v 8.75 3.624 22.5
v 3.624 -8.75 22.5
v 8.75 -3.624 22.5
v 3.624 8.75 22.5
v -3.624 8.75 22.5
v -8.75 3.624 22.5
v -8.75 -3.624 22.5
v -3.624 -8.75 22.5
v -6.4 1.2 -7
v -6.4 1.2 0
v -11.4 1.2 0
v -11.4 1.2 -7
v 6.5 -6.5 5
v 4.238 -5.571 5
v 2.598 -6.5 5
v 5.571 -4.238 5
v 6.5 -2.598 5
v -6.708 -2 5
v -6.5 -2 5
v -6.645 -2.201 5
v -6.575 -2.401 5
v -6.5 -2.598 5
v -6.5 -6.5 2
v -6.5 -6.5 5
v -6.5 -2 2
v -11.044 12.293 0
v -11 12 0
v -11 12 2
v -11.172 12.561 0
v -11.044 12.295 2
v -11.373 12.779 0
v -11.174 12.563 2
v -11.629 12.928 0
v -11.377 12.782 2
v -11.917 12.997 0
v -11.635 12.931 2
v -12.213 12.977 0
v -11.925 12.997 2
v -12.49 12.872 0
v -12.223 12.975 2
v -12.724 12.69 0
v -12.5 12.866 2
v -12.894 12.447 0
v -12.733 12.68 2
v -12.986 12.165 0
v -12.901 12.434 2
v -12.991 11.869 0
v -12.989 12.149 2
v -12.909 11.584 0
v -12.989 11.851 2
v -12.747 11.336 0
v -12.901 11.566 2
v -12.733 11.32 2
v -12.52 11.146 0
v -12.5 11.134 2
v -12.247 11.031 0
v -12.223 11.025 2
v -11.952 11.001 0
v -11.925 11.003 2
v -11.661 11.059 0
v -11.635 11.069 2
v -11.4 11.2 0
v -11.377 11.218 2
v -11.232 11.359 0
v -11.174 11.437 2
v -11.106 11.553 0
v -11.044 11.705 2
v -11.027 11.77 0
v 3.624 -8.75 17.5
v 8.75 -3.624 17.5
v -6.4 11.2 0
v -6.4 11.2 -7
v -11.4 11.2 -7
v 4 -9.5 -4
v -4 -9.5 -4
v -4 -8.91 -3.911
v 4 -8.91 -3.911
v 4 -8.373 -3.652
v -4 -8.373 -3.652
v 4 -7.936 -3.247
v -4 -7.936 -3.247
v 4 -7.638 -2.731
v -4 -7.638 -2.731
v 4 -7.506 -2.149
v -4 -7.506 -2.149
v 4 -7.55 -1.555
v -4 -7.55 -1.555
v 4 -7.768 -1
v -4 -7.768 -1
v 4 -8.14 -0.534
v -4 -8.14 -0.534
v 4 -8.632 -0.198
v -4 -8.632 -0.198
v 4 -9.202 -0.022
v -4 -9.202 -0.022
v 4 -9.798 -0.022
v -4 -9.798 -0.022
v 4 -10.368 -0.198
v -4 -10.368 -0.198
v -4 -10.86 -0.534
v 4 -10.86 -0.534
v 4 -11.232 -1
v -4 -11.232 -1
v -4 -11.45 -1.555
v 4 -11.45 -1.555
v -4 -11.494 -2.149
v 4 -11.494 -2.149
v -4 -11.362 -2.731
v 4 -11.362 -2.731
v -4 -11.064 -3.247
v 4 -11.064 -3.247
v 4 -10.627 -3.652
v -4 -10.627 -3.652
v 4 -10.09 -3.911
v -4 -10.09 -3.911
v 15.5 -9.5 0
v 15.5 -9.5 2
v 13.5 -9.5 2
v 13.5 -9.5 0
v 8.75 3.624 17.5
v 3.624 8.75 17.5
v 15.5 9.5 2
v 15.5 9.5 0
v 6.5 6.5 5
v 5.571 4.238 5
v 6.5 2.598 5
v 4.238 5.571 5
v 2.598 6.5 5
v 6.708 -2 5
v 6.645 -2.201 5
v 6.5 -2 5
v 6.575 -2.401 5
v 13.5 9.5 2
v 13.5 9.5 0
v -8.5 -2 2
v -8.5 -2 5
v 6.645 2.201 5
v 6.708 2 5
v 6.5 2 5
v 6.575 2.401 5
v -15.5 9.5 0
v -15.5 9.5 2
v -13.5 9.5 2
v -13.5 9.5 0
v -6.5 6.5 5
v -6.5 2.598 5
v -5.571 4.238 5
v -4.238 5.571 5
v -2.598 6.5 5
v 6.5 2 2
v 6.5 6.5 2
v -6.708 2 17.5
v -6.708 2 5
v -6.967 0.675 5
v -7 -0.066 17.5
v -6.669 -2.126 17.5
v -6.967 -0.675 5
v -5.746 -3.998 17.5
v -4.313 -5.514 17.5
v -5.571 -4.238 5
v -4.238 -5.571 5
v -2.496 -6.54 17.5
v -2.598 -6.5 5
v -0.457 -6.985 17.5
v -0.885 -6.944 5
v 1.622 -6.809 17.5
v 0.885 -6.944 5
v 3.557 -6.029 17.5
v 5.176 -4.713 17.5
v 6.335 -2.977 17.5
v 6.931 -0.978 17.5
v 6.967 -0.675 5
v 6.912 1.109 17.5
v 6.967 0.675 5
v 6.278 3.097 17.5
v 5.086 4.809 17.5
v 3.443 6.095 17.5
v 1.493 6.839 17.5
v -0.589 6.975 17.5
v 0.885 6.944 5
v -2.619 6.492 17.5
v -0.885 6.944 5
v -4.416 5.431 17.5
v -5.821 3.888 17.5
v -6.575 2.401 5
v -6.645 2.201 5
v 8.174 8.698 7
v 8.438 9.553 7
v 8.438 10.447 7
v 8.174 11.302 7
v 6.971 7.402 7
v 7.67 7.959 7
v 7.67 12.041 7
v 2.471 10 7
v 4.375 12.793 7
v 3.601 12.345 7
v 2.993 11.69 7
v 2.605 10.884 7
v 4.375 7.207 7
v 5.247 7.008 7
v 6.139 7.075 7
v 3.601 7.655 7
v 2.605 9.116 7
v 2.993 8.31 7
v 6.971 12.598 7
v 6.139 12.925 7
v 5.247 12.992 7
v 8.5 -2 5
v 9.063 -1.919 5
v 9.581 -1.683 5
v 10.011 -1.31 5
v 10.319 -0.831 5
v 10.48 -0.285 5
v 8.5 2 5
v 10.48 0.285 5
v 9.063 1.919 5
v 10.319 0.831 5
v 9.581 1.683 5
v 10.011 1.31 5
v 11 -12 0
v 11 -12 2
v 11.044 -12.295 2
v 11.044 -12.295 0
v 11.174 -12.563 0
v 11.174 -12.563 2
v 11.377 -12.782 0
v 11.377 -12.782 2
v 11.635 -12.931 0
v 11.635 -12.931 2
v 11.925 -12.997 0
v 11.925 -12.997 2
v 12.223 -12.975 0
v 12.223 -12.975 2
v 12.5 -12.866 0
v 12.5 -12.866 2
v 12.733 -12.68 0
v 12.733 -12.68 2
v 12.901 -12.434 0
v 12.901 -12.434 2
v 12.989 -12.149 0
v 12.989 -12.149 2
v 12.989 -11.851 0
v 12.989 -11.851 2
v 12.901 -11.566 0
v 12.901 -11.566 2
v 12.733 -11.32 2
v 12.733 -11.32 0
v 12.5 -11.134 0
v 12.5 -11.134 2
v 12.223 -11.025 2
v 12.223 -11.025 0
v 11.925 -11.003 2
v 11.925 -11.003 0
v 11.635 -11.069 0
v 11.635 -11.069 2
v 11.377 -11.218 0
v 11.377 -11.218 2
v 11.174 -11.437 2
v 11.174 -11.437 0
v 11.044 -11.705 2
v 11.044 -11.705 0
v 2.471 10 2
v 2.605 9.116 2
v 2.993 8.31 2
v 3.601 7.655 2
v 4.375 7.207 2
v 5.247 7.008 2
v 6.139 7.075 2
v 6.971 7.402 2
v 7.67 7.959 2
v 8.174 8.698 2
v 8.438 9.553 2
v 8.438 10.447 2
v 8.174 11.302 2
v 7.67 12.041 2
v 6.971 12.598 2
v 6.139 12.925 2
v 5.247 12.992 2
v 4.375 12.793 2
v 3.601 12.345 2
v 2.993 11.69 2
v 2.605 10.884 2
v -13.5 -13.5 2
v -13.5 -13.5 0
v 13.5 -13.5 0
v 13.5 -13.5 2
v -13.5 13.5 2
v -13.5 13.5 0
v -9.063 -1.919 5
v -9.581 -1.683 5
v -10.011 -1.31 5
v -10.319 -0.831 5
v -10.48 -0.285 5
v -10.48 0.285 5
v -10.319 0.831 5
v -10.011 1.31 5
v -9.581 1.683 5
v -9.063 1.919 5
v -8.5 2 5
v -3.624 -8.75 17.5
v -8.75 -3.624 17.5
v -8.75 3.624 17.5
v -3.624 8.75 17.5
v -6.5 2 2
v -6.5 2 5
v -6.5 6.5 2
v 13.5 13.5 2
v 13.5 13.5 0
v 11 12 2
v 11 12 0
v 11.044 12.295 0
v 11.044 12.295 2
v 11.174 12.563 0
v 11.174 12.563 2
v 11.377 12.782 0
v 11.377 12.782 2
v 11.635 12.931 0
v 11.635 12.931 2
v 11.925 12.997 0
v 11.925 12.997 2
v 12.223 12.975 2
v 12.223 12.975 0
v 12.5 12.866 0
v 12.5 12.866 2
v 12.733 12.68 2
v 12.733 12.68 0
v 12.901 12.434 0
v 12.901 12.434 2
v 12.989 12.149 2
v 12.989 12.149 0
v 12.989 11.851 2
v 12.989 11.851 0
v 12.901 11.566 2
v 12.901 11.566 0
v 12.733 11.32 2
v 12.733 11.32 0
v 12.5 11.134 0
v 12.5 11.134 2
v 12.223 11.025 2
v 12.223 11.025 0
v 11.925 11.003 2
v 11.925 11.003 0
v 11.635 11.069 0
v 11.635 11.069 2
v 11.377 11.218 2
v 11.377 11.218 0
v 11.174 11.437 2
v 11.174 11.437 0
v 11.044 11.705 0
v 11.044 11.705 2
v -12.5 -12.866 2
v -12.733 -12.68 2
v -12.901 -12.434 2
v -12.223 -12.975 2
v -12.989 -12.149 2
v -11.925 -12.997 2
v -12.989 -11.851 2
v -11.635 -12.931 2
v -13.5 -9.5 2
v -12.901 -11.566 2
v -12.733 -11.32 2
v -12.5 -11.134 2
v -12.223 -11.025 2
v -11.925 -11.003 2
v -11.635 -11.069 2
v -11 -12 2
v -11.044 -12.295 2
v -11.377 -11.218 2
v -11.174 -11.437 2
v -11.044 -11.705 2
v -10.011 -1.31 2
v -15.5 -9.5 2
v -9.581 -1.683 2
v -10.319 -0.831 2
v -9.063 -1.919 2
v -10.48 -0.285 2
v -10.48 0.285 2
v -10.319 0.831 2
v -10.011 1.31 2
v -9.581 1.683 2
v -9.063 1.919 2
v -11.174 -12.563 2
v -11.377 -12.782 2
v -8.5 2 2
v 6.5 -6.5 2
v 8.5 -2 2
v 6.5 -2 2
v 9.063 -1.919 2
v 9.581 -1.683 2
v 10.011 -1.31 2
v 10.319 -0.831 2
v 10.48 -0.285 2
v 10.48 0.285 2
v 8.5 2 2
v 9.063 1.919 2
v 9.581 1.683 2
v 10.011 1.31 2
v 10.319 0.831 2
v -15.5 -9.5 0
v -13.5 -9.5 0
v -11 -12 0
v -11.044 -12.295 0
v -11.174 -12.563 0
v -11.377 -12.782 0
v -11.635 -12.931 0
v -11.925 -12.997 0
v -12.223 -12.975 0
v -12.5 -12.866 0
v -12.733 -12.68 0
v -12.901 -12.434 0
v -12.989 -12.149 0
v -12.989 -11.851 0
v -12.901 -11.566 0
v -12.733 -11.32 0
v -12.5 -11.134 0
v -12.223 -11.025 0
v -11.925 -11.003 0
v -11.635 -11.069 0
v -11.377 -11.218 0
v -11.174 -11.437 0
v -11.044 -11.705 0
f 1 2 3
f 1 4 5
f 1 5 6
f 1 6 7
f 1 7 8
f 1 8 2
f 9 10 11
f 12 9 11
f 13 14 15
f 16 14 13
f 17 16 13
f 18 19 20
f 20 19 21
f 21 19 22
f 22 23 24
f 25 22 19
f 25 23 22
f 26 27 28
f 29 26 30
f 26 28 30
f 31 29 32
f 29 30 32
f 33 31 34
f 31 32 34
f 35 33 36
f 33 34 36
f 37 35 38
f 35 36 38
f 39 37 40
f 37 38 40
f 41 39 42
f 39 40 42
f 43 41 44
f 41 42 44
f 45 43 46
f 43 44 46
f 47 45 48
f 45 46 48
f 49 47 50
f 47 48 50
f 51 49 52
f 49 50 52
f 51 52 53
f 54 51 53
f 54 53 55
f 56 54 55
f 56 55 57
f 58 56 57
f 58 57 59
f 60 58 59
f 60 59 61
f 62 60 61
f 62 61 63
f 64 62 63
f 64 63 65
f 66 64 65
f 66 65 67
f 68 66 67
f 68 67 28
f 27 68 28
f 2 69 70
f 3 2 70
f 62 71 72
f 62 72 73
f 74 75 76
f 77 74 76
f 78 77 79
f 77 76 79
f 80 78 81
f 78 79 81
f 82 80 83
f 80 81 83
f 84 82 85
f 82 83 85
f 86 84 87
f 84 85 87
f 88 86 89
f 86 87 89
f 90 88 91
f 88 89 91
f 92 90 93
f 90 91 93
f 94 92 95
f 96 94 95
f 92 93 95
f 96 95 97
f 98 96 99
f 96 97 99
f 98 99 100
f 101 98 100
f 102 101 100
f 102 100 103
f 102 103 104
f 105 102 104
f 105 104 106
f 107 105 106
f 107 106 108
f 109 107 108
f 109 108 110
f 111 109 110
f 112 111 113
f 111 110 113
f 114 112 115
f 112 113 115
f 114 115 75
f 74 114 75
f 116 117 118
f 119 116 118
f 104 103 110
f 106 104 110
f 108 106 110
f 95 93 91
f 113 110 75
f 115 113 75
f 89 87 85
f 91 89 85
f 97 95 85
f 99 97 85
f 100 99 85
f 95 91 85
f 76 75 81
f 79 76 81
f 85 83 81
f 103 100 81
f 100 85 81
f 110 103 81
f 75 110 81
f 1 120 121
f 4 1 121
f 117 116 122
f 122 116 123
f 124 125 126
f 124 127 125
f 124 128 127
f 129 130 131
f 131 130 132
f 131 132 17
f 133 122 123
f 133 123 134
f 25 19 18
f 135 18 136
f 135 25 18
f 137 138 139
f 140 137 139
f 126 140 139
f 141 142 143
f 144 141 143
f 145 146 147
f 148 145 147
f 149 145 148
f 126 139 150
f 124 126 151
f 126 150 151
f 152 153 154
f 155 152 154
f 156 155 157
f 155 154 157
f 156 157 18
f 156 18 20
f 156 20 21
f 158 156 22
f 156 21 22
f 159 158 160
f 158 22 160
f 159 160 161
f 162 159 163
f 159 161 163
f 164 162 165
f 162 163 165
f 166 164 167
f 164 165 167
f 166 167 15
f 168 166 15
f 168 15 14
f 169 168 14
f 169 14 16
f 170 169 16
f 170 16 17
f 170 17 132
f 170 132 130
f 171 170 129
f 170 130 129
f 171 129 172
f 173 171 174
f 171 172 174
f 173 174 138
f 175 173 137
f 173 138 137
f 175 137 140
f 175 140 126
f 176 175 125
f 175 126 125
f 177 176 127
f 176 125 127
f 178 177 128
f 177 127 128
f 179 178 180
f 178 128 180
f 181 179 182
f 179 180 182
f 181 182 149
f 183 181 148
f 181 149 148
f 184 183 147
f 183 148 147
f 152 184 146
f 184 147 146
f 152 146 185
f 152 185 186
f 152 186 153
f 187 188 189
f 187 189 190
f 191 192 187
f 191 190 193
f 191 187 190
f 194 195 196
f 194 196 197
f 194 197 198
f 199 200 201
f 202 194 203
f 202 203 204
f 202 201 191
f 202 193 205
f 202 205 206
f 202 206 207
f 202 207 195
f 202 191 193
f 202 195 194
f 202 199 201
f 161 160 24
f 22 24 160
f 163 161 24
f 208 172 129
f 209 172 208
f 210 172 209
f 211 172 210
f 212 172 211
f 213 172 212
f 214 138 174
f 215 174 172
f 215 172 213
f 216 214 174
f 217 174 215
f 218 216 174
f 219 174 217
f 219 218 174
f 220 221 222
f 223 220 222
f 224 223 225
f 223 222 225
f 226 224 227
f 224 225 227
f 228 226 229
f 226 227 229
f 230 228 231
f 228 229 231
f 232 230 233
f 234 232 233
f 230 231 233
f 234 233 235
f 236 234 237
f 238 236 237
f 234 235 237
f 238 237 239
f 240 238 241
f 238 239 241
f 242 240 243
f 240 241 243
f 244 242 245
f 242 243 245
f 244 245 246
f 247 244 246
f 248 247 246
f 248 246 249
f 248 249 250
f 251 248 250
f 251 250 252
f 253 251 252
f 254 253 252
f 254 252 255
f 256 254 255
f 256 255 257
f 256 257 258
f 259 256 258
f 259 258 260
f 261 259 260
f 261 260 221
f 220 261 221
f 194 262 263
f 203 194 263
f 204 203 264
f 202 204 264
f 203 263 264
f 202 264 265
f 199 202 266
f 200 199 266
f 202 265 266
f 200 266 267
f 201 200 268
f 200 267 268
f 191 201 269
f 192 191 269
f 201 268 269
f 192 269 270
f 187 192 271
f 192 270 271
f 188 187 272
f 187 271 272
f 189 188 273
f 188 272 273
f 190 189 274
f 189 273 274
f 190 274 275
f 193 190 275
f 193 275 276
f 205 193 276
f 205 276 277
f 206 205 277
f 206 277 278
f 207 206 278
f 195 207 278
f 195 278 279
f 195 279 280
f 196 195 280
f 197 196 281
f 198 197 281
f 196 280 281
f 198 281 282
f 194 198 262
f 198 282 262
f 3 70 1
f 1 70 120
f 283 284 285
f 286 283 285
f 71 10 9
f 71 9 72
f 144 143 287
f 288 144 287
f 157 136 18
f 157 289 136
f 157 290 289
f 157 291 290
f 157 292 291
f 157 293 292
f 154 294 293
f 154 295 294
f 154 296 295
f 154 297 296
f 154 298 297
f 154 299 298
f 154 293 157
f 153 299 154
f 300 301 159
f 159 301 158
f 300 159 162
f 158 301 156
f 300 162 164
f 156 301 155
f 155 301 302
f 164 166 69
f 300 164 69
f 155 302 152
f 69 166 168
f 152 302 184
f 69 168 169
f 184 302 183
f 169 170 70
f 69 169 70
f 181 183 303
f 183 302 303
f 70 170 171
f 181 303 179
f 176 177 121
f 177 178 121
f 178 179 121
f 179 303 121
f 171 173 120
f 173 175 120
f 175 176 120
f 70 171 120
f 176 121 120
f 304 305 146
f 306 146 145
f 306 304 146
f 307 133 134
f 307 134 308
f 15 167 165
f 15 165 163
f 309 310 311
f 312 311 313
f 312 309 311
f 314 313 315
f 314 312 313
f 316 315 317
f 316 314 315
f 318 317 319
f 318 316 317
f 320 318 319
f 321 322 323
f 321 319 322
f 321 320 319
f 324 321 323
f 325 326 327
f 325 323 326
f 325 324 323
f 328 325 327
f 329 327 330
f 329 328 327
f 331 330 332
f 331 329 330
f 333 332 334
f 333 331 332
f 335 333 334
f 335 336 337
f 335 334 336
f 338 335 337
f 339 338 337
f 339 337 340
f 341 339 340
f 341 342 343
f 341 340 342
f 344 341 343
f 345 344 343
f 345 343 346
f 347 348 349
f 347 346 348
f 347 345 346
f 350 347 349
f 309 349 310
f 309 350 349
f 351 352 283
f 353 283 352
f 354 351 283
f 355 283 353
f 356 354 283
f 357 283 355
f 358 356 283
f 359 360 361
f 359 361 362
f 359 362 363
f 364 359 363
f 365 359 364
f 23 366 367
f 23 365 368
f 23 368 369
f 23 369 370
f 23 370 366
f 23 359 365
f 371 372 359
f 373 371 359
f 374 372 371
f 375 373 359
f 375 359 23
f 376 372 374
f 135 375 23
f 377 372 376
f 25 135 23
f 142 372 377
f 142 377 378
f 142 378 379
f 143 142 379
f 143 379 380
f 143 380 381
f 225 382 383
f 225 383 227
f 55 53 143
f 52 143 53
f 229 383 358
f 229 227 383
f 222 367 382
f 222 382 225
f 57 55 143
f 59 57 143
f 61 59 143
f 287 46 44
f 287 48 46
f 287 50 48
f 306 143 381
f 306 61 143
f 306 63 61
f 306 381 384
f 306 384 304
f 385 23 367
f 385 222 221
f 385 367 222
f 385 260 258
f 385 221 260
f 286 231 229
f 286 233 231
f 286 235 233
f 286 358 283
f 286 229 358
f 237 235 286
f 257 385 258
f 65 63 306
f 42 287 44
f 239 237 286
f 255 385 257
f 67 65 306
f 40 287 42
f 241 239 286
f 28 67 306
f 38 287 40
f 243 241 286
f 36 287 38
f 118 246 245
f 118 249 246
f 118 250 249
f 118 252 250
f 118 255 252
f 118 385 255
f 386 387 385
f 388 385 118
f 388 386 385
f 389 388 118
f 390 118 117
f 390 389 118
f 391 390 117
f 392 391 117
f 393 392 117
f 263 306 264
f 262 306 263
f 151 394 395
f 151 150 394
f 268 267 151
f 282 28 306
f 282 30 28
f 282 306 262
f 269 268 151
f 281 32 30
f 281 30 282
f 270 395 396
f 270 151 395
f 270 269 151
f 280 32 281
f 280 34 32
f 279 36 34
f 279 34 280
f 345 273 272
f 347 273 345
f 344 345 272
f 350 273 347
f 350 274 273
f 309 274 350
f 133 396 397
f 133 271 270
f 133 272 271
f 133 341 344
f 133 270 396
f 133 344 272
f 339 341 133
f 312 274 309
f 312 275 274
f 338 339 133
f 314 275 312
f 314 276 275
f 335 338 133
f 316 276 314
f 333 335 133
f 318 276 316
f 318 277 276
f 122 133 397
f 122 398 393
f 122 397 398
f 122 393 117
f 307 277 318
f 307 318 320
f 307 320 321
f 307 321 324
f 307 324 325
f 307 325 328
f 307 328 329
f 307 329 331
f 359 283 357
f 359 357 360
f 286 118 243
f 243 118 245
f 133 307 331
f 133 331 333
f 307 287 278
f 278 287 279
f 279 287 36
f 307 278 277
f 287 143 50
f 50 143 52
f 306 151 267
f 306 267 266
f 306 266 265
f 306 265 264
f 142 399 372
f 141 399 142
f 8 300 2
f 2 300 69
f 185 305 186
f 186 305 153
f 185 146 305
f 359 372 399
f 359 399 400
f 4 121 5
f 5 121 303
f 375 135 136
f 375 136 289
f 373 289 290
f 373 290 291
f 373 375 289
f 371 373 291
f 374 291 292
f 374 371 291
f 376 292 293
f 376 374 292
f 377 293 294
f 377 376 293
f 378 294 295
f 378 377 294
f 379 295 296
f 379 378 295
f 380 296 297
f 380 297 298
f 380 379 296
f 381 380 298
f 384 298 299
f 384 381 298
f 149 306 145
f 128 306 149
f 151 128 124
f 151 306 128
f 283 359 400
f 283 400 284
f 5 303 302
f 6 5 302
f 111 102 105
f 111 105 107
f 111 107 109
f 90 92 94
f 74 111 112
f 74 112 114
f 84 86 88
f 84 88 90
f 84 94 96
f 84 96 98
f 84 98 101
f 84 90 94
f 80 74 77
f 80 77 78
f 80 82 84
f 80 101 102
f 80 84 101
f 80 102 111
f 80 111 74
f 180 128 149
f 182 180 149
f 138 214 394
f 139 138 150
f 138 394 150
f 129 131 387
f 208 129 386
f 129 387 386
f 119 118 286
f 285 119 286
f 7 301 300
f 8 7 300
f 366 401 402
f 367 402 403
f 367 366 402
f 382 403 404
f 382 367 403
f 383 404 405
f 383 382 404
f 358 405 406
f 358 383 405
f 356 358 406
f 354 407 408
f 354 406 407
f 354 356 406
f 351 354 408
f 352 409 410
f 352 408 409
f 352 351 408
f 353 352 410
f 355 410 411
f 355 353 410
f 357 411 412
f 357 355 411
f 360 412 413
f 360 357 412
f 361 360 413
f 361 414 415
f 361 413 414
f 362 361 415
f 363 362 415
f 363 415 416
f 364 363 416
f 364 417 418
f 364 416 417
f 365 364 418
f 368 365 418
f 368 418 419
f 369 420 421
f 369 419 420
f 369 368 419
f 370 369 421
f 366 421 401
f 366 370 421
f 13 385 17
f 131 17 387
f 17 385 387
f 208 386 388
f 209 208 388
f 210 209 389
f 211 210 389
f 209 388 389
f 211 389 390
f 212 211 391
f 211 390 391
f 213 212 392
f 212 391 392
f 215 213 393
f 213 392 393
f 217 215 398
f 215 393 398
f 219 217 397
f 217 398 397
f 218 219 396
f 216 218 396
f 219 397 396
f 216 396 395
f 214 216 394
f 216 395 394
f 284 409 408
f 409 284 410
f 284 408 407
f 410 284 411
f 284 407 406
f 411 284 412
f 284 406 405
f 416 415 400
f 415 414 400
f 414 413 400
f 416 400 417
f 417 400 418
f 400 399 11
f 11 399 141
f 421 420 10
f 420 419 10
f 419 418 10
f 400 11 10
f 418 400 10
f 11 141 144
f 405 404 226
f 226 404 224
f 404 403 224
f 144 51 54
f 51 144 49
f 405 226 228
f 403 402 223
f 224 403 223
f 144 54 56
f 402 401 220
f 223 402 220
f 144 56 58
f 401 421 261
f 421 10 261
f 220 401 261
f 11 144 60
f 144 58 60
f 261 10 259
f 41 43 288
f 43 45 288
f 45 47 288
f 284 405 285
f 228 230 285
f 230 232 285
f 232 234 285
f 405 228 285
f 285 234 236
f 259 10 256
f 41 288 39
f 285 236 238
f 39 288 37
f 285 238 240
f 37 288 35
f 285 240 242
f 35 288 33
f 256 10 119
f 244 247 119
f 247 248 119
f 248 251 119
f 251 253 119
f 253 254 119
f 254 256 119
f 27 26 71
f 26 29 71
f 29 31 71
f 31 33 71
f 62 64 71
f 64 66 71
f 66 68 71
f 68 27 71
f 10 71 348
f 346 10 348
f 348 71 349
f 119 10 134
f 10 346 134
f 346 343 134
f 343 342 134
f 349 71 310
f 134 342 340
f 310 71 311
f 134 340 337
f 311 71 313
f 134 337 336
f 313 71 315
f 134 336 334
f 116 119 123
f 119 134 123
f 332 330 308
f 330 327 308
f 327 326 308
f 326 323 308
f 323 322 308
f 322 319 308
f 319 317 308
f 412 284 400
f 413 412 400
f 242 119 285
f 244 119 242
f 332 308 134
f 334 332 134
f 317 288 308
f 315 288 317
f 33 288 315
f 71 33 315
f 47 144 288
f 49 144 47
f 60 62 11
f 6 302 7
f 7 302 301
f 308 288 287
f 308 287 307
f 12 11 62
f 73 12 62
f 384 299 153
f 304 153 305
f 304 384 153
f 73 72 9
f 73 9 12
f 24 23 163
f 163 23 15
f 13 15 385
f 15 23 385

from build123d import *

# Parameters (mm, degrees)
SKETCH_1_W               = 31
SKETCH_1_H               = 27
EXTRUDE_426_DEPTH        = 2
SKETCH_2_W               = 2
SKETCH_2_H               = 4
CUT_EXTRUDE_591_DEPTH    = 21.651876428
SKETCH_3_R               = 1
CUT_EXTRUDE_937_DEPTH    = 21.651876428
MIRROR_2_COPY_1_SKETCH_W = 2
MIRROR_2_COPY_1_SKETCH_H = 4
MIRROR_2_COPY_1_DEPTH    = 21.651876428
MIRROR_2_COPY_2_SKETCH_R = 1
MIRROR_2_COPY_2_DEPTH    = 21.651876428
SKETCH_4_W               = 13
SKETCH_4_H               = 13
EXTRUDE_1335_DEPTH       = 3
EXTRUDE_1862_DEPTH       = 3
SKETCH_6_R               = 7
EXTRUDE_2122_DEPTH       = 12.5
EXTRUDE_2384_DEPTH       = 5
SKETCH_8_R               = 3
EXTRUDE_2930_DEPTH       = 5
SKETCH_9_W               = 5
SKETCH_9_H               = 10
USB_DEPTH                = 7
EXTRUDE_3576_DEPTH       = 4
EXTRUDE_3576_DEPTH_BACK  = 4
SKETCH_10_R              = 2


with BuildPart() as part:
    # Эскиз1 → Extrude 426 (new body)
    with BuildSketch(Plane.XY):
        Rectangle(SKETCH_1_W, SKETCH_1_H)
    extrude(amount=EXTRUDE_426_DEPTH)

    # Эскиз2 → Cut-Extrude 591 (cut, symmetric)
    with BuildSketch(Plane.XY.offset(2)):
        with Locations((-14.5, 11.5)):
            Rectangle(SKETCH_2_W, SKETCH_2_H)
    cut_extrude_591 = extrude(amount=CUT_EXTRUDE_591_DEPTH, both=True, mode=Mode.SUBTRACT)

    # Эскиз3 → Cut-Extrude 937 (cut, through all)
    with BuildSketch(Plane.XY.offset(2)):
        with Locations((-12, 12)):
            Circle(SKETCH_3_R)
    cut_extrude_937 = extrude(amount=-CUT_EXTRUDE_937_DEPTH, mode=Mode.SUBTRACT)

    # Зеркальное отражение1: Cut-Extrude 591, Cut-Extrude 937 across plane
    add(cut_extrude_591.mirror(Plane(origin=(0, 0, 0), x_dir=(0, 0, 1), z_dir=(1, 0, 0))), mode=Mode.SUBTRACT)
    add(cut_extrude_937.mirror(Plane(origin=(0, 0, 0), x_dir=(0, 0, 1), z_dir=(1, 0, 0))), mode=Mode.SUBTRACT)

    # Зеркальное отражение2: Cut-Extrude 591, Cut-Extrude 937 across plane
    add(cut_extrude_591.mirror(Plane.ZX), mode=Mode.SUBTRACT)
    add(cut_extrude_937.mirror(Plane.ZX), mode=Mode.SUBTRACT)

    # Зеркальное отражение2 copy 1 sketch → Зеркальное отражение2 copy 1 (cut, symmetric)
    with BuildSketch(Plane(origin=(0, 0, 2), x_dir=(-1, 0, 0), z_dir=(0, 0, 1))):
        with Locations((-14.5, 11.5)):
            Rectangle(MIRROR_2_COPY_1_SKETCH_W, MIRROR_2_COPY_1_SKETCH_H)
    extrude(amount=MIRROR_2_COPY_1_DEPTH, both=True, mode=Mode.SUBTRACT)

    # Зеркальное отражение2 copy 2 sketch → Зеркальное отражение2 copy 2 (cut, through all)
    with BuildSketch(Plane(origin=(0, 0, 2), x_dir=(-1, 0, 0), z_dir=(0, 0, 1))):
        with Locations((-12, 12)):
            Circle(MIRROR_2_COPY_2_SKETCH_R)
    extrude(amount=-MIRROR_2_COPY_2_DEPTH, mode=Mode.SUBTRACT)

    # Эскиз4 → Extrude 1335 (add)
    with BuildSketch(Plane.XY.offset(2)):
        Rectangle(SKETCH_4_W, SKETCH_4_H)
    extrude(amount=EXTRUDE_1335_DEPTH)

    # Эскиз5 → Extrude 1862 (add)
    with BuildSketch(Plane.XY.offset(2)):
        with BuildLine():
            Line((6.5, 2), (6.5, -2))
            Line((6.5, -2), (8.5, -2))
            ThreePointArc((8.5, -2), (10.5, 0), (8.5, 2))
            Line((8.5, 2), (6.5, 2))
        make_face()
        with BuildLine():
            Line((-6.5, 2), (-6.5, -2))
            Line((-6.5, -2), (-8.5, -2))
            ThreePointArc((-8.5, -2), (-10.5, 0), (-8.5, 2))
            Line((-8.5, 2), (-6.5, 2))
        make_face()
    extrude(amount=EXTRUDE_1862_DEPTH)

    # Эскиз6 → Extrude 2122 (add)
    with BuildSketch(Plane.XY.offset(5)):
        with Locations(Location((0, 0, 0), (0, 0, 163.398450401))):
            Circle(SKETCH_6_R)
    extrude(amount=EXTRUDE_2122_DEPTH)

    # Эскиз7 → Extrude 2384 (add)
    with BuildSketch(Plane.XY.offset(17.5)):
        Polygon((3.624368671, -8.75), (8.75, -3.624368671), (8.75, 3.624368671), (3.624368671, 8.75), (-3.624368671, 8.75), (-8.75, 3.624368671), (-8.75, -3.624368671), (-3.624368671, -8.75), align=None)
    extrude(amount=EXTRUDE_2384_DEPTH)

    # Эскиз8 → Extrude 2930 (add)
    with BuildSketch(Plane.XY.offset(2)):
        with Locations(Location((5.471283186, 10, 0), (0, 0, 180))):
            Circle(SKETCH_8_R)
    extrude(amount=EXTRUDE_2930_DEPTH)

    # Эскиз9 → usb (add)
    with BuildSketch(Plane(origin=(0, 0, 0), x_dir=(-1, 0, 0), z_dir=(0, 0, -1))):
        with Locations((8.9, 6.2)):
            Rectangle(SKETCH_9_W, SKETCH_9_H)
    extrude(amount=USB_DEPTH)


with BuildPart() as body_2:
    # Эскиз10 → Extrude 3576 (new, two sides: drawn at the far end of the back side and taken through both)
    with BuildSketch(Plane(origin=(0, 0, 0), x_dir=(0, 0, -1), z_dir=(1, 0, 0)).offset(-EXTRUDE_3576_DEPTH_BACK)):
        with Locations((2, -9.5)):
            Circle(SKETCH_10_R)
    extrude(amount=EXTRUDE_3576_DEPTH + EXTRUDE_3576_DEPTH_BACK)


solid = Compound([part.part, body_2.part])
